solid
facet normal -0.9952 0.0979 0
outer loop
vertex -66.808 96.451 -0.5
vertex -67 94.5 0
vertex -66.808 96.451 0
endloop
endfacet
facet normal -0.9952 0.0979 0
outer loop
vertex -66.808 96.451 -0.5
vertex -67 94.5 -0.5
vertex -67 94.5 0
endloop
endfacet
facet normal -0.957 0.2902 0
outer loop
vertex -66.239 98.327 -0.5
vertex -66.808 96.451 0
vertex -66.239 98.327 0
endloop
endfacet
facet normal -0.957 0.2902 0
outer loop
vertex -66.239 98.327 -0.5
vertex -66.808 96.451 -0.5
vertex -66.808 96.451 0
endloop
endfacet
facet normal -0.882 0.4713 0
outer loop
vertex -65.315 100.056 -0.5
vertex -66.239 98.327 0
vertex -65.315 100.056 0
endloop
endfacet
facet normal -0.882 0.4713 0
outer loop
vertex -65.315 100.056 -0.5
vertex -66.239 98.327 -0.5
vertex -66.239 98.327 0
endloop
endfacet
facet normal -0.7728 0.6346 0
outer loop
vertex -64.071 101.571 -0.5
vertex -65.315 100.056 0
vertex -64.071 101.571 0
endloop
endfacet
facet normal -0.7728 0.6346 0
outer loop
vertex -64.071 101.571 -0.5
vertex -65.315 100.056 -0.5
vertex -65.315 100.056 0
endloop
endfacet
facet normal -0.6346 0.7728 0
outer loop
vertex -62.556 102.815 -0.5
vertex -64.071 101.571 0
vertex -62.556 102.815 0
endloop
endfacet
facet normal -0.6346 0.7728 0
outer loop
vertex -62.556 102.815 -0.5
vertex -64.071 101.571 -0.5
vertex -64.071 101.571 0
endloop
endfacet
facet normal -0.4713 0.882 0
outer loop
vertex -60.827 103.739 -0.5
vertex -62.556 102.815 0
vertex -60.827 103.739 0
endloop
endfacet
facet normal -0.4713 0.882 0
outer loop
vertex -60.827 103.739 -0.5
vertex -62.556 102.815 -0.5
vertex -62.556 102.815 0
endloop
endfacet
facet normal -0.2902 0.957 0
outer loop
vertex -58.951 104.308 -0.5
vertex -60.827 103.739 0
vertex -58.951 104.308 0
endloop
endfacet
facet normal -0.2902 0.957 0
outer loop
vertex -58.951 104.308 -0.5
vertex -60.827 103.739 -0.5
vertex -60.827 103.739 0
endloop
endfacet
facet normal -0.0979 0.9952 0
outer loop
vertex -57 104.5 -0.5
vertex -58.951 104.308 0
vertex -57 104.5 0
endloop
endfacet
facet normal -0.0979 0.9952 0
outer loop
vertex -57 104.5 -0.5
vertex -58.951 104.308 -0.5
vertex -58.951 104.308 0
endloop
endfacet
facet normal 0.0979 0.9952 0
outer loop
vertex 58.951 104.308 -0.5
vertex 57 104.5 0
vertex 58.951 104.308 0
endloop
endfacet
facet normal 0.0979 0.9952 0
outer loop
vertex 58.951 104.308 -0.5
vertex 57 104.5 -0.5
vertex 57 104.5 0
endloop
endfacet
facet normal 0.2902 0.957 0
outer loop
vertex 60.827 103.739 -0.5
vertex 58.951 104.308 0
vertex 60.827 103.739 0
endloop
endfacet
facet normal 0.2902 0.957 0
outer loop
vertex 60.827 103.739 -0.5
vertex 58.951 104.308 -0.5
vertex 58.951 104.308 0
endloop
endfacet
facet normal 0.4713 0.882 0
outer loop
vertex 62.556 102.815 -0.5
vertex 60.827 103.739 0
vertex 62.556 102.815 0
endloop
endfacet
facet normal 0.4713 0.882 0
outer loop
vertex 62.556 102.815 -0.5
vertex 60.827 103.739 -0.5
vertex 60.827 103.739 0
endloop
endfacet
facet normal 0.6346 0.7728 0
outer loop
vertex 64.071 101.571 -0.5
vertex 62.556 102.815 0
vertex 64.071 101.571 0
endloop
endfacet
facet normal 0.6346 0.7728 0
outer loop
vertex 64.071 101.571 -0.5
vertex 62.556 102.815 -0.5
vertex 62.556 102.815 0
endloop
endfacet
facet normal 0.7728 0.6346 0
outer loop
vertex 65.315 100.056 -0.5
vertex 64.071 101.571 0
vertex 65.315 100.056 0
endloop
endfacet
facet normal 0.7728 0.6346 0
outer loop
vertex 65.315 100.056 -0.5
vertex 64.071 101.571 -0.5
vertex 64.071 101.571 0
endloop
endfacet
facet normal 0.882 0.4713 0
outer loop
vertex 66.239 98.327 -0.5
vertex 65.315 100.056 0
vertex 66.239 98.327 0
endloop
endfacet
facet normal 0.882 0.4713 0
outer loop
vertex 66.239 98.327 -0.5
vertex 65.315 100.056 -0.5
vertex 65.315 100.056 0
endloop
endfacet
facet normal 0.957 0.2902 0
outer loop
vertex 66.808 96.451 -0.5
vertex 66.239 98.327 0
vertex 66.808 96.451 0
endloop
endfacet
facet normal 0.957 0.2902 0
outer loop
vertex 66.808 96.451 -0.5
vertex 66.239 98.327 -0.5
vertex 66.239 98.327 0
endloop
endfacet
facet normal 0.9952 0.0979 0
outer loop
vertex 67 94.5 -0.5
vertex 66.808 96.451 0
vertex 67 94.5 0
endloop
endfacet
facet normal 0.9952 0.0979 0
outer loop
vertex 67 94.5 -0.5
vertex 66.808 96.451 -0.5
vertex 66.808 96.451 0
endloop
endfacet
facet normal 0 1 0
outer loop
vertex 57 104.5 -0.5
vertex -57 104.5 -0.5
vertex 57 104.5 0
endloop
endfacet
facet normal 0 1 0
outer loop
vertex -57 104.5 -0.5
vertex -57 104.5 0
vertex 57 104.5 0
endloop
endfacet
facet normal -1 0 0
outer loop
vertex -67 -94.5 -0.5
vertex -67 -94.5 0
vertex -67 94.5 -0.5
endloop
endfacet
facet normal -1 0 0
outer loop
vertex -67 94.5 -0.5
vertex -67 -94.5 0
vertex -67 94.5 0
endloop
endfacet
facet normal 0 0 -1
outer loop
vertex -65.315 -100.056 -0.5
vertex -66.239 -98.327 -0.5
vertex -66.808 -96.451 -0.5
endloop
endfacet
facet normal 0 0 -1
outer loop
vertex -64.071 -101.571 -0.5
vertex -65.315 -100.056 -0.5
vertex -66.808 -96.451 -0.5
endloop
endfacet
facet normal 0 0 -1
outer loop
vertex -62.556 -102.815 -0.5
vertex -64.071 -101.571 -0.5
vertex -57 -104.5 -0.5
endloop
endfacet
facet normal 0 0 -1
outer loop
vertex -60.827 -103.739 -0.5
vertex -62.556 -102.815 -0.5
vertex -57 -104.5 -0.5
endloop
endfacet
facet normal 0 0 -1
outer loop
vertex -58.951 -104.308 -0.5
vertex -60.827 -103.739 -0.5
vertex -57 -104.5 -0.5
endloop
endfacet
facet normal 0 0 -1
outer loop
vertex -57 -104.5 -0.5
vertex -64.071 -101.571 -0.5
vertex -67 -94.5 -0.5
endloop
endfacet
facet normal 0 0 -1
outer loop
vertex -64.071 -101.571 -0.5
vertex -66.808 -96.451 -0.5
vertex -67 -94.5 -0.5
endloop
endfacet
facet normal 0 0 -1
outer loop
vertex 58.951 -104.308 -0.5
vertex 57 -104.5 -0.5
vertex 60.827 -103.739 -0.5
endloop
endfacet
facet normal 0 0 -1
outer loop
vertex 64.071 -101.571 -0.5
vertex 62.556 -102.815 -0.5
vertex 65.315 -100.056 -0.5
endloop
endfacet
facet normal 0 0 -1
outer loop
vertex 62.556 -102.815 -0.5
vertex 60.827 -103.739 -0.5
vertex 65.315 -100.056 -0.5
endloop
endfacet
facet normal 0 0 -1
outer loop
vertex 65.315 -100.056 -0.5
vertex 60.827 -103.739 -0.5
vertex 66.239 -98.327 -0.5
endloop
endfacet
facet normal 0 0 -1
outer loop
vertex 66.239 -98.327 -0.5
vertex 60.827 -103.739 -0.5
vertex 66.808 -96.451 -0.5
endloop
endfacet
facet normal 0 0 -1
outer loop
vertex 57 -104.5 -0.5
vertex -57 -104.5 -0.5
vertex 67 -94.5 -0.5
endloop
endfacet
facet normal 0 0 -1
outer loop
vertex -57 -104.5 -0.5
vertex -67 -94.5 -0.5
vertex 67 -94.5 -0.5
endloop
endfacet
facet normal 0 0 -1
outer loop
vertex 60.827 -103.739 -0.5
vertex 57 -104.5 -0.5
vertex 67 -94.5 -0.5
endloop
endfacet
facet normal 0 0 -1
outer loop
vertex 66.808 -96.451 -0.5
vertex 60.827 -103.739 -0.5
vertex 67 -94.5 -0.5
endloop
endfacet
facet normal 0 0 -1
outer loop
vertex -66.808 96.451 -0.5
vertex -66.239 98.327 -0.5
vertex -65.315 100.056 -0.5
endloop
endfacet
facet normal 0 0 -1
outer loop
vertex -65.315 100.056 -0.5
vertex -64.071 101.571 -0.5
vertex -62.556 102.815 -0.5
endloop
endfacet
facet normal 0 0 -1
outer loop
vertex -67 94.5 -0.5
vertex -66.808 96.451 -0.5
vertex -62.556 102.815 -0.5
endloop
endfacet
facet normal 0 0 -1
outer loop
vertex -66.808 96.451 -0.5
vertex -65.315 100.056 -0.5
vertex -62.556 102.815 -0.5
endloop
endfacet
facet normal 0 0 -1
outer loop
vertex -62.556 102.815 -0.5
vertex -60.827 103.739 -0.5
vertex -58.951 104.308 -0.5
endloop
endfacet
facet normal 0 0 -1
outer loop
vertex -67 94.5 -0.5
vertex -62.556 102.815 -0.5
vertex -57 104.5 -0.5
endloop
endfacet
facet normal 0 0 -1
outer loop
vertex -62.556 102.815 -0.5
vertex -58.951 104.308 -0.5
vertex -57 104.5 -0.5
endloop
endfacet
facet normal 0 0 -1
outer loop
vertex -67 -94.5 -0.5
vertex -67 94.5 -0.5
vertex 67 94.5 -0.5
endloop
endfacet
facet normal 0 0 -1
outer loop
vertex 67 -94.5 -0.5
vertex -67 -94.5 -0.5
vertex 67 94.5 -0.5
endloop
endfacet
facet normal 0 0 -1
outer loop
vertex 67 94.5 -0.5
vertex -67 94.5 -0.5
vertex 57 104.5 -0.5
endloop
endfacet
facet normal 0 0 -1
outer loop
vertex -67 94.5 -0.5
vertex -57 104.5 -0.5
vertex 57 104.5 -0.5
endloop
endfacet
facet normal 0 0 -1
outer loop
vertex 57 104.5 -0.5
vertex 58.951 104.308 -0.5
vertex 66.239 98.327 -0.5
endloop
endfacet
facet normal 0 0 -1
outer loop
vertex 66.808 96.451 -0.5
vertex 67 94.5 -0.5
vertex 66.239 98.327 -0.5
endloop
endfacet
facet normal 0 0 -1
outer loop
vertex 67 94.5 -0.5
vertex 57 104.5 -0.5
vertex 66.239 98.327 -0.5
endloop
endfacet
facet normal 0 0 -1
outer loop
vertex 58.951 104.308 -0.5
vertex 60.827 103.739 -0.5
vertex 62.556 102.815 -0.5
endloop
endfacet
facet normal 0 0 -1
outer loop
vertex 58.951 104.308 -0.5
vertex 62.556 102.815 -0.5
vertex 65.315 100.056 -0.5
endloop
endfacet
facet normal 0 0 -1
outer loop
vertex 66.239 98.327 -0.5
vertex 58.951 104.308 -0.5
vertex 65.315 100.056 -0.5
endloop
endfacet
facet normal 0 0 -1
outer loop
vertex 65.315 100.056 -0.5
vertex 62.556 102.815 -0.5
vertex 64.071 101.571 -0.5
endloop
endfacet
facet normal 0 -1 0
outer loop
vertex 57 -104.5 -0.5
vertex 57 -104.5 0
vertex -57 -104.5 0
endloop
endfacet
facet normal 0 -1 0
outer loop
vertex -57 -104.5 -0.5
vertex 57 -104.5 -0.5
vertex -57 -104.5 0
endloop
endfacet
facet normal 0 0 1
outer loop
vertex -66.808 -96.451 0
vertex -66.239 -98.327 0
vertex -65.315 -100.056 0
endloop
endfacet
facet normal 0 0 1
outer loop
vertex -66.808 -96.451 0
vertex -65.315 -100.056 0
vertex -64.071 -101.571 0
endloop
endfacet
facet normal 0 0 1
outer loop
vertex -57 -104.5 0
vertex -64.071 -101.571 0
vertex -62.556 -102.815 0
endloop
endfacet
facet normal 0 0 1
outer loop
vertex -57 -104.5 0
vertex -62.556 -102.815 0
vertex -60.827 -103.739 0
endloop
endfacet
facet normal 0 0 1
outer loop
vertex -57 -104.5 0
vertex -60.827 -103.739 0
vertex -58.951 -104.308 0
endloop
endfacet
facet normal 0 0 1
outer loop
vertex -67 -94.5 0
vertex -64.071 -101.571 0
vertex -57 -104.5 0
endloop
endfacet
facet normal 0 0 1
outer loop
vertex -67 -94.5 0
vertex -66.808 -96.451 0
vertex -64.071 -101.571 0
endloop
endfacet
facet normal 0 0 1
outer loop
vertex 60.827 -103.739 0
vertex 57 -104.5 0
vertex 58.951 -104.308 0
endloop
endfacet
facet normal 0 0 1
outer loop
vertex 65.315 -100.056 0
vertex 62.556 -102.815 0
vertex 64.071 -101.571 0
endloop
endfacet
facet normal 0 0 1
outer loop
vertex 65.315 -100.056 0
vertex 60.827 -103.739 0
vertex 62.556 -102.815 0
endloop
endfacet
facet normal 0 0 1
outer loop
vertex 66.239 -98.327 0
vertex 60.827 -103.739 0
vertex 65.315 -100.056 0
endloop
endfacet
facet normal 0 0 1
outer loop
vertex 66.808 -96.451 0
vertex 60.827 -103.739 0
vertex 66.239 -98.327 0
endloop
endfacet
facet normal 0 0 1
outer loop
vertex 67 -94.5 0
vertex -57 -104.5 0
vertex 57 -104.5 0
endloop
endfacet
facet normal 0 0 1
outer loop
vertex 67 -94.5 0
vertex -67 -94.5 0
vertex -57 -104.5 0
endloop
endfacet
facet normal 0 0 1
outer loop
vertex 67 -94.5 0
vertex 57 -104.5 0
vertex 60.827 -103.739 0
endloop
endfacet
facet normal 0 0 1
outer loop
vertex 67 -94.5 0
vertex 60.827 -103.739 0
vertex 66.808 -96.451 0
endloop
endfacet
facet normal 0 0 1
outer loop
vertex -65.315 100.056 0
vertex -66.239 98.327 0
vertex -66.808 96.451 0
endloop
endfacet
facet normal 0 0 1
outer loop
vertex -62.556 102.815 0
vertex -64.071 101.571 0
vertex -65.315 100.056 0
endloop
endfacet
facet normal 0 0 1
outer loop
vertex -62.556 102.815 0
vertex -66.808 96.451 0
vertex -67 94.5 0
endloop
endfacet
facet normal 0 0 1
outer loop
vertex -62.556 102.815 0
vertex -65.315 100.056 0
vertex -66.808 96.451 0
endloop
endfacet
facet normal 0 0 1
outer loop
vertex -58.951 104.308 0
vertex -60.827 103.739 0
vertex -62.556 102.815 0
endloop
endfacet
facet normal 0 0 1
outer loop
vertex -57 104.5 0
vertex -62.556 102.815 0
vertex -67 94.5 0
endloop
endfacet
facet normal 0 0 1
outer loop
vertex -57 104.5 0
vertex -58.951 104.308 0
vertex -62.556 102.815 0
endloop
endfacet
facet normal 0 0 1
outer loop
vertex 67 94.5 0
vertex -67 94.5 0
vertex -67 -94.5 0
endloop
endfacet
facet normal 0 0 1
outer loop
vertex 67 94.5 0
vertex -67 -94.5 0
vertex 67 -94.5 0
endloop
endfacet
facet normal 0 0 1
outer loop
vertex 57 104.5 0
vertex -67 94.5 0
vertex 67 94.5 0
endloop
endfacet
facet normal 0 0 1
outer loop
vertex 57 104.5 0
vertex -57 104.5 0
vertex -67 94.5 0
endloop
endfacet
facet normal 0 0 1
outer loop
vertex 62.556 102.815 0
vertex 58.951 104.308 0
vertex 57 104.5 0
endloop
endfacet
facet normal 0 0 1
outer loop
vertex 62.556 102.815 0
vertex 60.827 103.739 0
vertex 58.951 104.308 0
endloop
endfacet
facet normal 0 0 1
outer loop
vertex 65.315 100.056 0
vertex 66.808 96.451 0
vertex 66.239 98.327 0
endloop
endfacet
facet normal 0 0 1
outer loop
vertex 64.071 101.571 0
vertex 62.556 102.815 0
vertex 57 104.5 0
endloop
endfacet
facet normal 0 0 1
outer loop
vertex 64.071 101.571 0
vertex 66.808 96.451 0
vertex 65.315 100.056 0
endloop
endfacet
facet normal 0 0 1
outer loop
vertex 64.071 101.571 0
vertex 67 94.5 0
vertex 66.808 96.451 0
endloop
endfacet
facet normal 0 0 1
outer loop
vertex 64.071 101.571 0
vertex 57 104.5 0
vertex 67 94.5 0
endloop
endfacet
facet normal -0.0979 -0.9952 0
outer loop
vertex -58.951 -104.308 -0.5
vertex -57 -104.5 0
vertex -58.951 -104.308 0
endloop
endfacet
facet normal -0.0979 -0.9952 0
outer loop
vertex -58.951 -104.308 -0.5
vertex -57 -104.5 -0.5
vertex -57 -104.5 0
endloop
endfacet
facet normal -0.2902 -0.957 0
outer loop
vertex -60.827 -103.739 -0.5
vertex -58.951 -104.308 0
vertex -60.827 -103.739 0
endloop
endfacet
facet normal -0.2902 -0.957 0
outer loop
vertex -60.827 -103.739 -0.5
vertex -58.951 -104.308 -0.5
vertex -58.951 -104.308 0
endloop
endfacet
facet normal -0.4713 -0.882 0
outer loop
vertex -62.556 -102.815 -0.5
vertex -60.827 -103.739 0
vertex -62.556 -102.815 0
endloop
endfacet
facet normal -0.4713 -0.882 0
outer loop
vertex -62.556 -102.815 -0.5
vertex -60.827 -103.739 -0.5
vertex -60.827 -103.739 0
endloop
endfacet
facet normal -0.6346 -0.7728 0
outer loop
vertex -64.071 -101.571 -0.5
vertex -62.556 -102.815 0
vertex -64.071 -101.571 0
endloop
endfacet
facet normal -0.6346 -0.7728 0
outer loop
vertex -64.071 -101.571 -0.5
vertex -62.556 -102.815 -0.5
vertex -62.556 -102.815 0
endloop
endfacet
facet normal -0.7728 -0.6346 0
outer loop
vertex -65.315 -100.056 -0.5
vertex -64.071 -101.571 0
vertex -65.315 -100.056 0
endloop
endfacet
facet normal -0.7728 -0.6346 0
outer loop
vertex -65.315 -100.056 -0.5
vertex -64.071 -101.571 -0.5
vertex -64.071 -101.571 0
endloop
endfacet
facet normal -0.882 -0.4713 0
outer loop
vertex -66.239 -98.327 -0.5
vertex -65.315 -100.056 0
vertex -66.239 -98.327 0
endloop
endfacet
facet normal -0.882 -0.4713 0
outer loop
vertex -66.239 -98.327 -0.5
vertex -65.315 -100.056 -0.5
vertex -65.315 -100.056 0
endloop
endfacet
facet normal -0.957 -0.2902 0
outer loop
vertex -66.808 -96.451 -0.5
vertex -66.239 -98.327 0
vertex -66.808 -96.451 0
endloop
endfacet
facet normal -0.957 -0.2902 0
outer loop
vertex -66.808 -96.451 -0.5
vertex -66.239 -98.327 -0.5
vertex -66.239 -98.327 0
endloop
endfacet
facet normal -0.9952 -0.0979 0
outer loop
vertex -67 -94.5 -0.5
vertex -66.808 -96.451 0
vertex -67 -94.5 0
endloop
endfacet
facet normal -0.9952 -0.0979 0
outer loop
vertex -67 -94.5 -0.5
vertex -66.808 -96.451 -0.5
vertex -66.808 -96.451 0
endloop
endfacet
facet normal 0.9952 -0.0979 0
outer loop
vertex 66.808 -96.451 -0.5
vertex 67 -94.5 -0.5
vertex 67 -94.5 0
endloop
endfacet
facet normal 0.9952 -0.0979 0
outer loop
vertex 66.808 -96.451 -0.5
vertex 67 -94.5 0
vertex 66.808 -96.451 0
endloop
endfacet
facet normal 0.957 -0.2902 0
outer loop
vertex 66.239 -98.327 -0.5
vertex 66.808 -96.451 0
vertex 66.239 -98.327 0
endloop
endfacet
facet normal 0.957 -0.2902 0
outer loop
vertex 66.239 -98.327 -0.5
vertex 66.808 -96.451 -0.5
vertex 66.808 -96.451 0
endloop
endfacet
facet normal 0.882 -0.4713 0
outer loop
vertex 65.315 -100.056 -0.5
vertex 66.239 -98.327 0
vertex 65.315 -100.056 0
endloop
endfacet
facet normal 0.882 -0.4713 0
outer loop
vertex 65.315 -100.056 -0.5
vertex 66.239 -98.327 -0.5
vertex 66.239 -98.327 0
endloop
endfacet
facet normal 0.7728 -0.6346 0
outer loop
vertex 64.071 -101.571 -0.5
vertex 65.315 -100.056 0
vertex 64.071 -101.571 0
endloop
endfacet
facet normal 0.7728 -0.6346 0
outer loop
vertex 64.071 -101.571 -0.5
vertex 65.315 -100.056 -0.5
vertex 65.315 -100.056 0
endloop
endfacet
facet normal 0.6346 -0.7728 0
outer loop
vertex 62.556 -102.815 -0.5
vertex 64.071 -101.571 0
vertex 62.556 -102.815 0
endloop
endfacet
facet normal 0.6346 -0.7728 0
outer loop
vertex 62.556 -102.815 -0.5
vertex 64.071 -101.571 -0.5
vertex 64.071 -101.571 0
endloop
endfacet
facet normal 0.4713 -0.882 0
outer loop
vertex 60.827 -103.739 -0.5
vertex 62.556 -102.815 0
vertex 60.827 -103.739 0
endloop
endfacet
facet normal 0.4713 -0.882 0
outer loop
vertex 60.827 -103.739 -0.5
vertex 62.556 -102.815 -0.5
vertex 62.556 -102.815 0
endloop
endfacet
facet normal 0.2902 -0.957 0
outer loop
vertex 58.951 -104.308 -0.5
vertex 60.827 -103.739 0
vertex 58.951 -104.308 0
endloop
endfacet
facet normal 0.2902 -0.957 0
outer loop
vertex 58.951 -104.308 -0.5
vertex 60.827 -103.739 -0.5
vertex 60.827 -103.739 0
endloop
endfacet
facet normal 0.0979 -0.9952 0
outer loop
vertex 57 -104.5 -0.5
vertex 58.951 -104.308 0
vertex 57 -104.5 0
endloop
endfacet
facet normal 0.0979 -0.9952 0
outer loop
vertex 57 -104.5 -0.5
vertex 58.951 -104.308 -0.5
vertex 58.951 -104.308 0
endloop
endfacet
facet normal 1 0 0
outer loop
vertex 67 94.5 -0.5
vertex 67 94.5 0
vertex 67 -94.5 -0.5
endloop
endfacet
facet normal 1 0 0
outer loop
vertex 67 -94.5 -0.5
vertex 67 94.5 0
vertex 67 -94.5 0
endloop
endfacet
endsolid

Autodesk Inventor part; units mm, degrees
ref_plane "YZ Plane" through (0, 0, 0) normal (1, 0, 0) x (0, 1, 0)
ref_plane "XZ Plane" through (0, 0, 0) normal (0, 1, 0) x (-1, 0, 0)
ref_plane "XY Plane" through (0, 0, 0) normal (0, 0, 1) x (1, 0, 0)
sketch "Sketch1" plane through (0, 0, 0) normal (0, 0, 1) x (1, 0, 0)
  line L0 (-67, 104.5) -> (67, 104.5)
  line L1 (67, 104.5) -> (67, -104.5)
  line L2 (67, -104.5) -> (-67, -104.5)
  line L3 (-67, -104.5) -> (-67, 104.5)
  line L4 (66, 103.5) -> (-66, 103.5)
  line L5 (-66, 103.5) -> (-66, -103.5)
  line L6 (-66, -103.5) -> (66, -103.5)
  line L7 (66, -103.5) -> (66, 103.5)
  point P0 (0, 0)
  point P1 (-67, 0)
  point P2 (0, 104.5)
  dimension "d0" = 134
  dimension "d1" = 209
  dimension "d2" = 1
extrude "Extrusion1" add sketch "Sketch1" against normal blind 0.5 contours L0 L1 L2 L3 | L7 L6 L5 L4
fillet "Fillet1" radius 10 4 edges at (-67, 104.5, -0.25) (67, 104.5, -0.25) (67, -104.5, -0.25) (-67, -104.5, -0.25)
properties part number "FSI Plate" material "Aluminum 6061"
